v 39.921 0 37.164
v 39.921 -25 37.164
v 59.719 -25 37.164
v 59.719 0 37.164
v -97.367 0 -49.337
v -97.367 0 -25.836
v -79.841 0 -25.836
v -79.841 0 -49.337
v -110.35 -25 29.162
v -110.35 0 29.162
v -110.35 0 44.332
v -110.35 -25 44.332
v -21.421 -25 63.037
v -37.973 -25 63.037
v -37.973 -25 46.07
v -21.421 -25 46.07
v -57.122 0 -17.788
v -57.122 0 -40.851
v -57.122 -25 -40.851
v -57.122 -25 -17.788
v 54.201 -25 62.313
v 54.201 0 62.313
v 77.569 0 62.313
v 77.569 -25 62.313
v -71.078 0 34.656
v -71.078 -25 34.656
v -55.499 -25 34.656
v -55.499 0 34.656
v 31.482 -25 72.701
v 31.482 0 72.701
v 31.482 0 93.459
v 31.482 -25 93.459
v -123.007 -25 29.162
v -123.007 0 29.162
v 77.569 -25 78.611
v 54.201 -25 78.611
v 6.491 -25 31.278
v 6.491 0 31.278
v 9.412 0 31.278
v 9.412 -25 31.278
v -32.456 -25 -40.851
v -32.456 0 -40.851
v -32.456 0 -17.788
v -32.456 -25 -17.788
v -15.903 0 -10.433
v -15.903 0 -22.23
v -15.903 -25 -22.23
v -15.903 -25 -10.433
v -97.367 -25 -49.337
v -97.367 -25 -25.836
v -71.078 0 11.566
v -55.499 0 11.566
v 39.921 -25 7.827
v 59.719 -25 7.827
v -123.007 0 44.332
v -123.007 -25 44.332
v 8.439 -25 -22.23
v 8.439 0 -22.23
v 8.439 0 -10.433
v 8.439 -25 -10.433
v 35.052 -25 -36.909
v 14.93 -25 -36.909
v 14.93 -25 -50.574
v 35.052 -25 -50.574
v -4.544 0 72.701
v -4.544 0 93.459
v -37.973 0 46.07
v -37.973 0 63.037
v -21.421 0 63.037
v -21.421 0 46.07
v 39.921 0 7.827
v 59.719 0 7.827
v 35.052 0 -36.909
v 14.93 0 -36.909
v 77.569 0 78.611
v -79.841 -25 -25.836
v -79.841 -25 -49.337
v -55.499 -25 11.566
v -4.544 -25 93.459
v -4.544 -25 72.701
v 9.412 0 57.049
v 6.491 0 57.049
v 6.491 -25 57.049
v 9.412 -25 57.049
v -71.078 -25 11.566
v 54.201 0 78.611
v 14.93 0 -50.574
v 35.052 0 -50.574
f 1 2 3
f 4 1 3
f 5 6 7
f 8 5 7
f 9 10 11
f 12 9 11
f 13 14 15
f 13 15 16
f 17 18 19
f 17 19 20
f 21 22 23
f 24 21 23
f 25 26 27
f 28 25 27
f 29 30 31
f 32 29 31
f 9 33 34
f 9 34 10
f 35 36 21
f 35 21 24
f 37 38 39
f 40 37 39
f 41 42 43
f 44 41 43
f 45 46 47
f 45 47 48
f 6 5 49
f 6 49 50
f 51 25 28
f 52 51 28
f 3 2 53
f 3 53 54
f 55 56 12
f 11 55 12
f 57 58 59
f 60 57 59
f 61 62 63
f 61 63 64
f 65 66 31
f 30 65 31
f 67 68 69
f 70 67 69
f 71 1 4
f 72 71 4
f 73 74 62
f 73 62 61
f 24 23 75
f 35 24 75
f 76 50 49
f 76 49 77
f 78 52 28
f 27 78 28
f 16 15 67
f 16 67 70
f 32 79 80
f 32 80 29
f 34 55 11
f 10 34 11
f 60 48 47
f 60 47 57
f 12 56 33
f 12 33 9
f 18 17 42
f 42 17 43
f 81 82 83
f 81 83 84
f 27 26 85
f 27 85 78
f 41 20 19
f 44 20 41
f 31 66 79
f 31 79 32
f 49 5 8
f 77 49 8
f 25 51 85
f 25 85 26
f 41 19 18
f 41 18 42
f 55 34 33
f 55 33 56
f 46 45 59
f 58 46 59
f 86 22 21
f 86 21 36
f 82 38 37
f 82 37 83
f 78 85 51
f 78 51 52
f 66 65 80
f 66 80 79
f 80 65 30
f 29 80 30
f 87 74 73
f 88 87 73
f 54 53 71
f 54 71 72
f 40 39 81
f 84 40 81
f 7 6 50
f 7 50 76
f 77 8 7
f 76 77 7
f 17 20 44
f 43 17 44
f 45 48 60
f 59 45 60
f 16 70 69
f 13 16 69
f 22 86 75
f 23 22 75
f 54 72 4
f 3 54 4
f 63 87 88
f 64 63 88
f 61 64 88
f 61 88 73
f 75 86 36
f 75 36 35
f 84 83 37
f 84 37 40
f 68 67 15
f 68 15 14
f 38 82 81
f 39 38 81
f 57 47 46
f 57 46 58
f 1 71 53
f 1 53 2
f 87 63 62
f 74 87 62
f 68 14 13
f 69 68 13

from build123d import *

# Parameters (mm, degrees)
F0_W     = 12.657762
F0_H     = 15.170373
F0_W_2   = 17.526134
F0_H_2   = 23.501746
F0_W_3   = 15.57878
F0_H_3   = 23.090221
F0_W_4   = 16.552458
F0_H_4   = 16.967103
F0_W_5   = 2.921027
F0_H_5   = 25.77053
F0_W_6   = 19.798029
F0_H_6   = 29.337074
F0_W_7   = 20.122594
F0_H_7   = 13.664588
F0_W_8   = 24.666406
F0_H_8   = 23.063319
F0_W_9   = 24.341842
F0_H_9   = 11.797486
F0_W_10  = 23.368184
F0_H_10  = 16.297798
F0_W_11  = 36.025939
F0_H_11  = 20.75778
F1_DEPTH = 25


with BuildPart() as f1:
    # F0 (on Front) → F1 (new body)
    with BuildSketch(Plane.XZ):
        with Locations((-116.678603, 36.746874)):
            Rectangle(F0_W, F0_H)
        with Locations((-88.604331, -37.586514)):
            Rectangle(F0_W_2, F0_H_2)
        with Locations((-63.288806, 23.111239)):
            Rectangle(F0_W_3, F0_H_3)
        with Locations((-29.697056, 54.553732)):
            Rectangle(F0_W_4, F0_H_4)
        with Locations((7.951676, 44.163432)):
            Rectangle(F0_W_5, F0_H_5)
        with Locations((49.819654, 22.495644)):
            Rectangle(F0_W_6, F0_H_6)
        with Locations((24.990969, -43.741334)):
            Rectangle(F0_W_7, F0_H_7)
        with Locations((-44.789005, -29.31965)):
            Rectangle(F0_W_8, F0_H_8)
        with Locations((-3.732418, -16.331683)):
            Rectangle(F0_W_9, F0_H_9)
        with Locations((65.885274, 70.461886)):
            Rectangle(F0_W_10, F0_H_10)
        with Locations((13.469153, 83.080359)):
            Rectangle(F0_W_11, F0_H_11)
    extrude(amount=F1_DEPTH)


solid = f1.part
